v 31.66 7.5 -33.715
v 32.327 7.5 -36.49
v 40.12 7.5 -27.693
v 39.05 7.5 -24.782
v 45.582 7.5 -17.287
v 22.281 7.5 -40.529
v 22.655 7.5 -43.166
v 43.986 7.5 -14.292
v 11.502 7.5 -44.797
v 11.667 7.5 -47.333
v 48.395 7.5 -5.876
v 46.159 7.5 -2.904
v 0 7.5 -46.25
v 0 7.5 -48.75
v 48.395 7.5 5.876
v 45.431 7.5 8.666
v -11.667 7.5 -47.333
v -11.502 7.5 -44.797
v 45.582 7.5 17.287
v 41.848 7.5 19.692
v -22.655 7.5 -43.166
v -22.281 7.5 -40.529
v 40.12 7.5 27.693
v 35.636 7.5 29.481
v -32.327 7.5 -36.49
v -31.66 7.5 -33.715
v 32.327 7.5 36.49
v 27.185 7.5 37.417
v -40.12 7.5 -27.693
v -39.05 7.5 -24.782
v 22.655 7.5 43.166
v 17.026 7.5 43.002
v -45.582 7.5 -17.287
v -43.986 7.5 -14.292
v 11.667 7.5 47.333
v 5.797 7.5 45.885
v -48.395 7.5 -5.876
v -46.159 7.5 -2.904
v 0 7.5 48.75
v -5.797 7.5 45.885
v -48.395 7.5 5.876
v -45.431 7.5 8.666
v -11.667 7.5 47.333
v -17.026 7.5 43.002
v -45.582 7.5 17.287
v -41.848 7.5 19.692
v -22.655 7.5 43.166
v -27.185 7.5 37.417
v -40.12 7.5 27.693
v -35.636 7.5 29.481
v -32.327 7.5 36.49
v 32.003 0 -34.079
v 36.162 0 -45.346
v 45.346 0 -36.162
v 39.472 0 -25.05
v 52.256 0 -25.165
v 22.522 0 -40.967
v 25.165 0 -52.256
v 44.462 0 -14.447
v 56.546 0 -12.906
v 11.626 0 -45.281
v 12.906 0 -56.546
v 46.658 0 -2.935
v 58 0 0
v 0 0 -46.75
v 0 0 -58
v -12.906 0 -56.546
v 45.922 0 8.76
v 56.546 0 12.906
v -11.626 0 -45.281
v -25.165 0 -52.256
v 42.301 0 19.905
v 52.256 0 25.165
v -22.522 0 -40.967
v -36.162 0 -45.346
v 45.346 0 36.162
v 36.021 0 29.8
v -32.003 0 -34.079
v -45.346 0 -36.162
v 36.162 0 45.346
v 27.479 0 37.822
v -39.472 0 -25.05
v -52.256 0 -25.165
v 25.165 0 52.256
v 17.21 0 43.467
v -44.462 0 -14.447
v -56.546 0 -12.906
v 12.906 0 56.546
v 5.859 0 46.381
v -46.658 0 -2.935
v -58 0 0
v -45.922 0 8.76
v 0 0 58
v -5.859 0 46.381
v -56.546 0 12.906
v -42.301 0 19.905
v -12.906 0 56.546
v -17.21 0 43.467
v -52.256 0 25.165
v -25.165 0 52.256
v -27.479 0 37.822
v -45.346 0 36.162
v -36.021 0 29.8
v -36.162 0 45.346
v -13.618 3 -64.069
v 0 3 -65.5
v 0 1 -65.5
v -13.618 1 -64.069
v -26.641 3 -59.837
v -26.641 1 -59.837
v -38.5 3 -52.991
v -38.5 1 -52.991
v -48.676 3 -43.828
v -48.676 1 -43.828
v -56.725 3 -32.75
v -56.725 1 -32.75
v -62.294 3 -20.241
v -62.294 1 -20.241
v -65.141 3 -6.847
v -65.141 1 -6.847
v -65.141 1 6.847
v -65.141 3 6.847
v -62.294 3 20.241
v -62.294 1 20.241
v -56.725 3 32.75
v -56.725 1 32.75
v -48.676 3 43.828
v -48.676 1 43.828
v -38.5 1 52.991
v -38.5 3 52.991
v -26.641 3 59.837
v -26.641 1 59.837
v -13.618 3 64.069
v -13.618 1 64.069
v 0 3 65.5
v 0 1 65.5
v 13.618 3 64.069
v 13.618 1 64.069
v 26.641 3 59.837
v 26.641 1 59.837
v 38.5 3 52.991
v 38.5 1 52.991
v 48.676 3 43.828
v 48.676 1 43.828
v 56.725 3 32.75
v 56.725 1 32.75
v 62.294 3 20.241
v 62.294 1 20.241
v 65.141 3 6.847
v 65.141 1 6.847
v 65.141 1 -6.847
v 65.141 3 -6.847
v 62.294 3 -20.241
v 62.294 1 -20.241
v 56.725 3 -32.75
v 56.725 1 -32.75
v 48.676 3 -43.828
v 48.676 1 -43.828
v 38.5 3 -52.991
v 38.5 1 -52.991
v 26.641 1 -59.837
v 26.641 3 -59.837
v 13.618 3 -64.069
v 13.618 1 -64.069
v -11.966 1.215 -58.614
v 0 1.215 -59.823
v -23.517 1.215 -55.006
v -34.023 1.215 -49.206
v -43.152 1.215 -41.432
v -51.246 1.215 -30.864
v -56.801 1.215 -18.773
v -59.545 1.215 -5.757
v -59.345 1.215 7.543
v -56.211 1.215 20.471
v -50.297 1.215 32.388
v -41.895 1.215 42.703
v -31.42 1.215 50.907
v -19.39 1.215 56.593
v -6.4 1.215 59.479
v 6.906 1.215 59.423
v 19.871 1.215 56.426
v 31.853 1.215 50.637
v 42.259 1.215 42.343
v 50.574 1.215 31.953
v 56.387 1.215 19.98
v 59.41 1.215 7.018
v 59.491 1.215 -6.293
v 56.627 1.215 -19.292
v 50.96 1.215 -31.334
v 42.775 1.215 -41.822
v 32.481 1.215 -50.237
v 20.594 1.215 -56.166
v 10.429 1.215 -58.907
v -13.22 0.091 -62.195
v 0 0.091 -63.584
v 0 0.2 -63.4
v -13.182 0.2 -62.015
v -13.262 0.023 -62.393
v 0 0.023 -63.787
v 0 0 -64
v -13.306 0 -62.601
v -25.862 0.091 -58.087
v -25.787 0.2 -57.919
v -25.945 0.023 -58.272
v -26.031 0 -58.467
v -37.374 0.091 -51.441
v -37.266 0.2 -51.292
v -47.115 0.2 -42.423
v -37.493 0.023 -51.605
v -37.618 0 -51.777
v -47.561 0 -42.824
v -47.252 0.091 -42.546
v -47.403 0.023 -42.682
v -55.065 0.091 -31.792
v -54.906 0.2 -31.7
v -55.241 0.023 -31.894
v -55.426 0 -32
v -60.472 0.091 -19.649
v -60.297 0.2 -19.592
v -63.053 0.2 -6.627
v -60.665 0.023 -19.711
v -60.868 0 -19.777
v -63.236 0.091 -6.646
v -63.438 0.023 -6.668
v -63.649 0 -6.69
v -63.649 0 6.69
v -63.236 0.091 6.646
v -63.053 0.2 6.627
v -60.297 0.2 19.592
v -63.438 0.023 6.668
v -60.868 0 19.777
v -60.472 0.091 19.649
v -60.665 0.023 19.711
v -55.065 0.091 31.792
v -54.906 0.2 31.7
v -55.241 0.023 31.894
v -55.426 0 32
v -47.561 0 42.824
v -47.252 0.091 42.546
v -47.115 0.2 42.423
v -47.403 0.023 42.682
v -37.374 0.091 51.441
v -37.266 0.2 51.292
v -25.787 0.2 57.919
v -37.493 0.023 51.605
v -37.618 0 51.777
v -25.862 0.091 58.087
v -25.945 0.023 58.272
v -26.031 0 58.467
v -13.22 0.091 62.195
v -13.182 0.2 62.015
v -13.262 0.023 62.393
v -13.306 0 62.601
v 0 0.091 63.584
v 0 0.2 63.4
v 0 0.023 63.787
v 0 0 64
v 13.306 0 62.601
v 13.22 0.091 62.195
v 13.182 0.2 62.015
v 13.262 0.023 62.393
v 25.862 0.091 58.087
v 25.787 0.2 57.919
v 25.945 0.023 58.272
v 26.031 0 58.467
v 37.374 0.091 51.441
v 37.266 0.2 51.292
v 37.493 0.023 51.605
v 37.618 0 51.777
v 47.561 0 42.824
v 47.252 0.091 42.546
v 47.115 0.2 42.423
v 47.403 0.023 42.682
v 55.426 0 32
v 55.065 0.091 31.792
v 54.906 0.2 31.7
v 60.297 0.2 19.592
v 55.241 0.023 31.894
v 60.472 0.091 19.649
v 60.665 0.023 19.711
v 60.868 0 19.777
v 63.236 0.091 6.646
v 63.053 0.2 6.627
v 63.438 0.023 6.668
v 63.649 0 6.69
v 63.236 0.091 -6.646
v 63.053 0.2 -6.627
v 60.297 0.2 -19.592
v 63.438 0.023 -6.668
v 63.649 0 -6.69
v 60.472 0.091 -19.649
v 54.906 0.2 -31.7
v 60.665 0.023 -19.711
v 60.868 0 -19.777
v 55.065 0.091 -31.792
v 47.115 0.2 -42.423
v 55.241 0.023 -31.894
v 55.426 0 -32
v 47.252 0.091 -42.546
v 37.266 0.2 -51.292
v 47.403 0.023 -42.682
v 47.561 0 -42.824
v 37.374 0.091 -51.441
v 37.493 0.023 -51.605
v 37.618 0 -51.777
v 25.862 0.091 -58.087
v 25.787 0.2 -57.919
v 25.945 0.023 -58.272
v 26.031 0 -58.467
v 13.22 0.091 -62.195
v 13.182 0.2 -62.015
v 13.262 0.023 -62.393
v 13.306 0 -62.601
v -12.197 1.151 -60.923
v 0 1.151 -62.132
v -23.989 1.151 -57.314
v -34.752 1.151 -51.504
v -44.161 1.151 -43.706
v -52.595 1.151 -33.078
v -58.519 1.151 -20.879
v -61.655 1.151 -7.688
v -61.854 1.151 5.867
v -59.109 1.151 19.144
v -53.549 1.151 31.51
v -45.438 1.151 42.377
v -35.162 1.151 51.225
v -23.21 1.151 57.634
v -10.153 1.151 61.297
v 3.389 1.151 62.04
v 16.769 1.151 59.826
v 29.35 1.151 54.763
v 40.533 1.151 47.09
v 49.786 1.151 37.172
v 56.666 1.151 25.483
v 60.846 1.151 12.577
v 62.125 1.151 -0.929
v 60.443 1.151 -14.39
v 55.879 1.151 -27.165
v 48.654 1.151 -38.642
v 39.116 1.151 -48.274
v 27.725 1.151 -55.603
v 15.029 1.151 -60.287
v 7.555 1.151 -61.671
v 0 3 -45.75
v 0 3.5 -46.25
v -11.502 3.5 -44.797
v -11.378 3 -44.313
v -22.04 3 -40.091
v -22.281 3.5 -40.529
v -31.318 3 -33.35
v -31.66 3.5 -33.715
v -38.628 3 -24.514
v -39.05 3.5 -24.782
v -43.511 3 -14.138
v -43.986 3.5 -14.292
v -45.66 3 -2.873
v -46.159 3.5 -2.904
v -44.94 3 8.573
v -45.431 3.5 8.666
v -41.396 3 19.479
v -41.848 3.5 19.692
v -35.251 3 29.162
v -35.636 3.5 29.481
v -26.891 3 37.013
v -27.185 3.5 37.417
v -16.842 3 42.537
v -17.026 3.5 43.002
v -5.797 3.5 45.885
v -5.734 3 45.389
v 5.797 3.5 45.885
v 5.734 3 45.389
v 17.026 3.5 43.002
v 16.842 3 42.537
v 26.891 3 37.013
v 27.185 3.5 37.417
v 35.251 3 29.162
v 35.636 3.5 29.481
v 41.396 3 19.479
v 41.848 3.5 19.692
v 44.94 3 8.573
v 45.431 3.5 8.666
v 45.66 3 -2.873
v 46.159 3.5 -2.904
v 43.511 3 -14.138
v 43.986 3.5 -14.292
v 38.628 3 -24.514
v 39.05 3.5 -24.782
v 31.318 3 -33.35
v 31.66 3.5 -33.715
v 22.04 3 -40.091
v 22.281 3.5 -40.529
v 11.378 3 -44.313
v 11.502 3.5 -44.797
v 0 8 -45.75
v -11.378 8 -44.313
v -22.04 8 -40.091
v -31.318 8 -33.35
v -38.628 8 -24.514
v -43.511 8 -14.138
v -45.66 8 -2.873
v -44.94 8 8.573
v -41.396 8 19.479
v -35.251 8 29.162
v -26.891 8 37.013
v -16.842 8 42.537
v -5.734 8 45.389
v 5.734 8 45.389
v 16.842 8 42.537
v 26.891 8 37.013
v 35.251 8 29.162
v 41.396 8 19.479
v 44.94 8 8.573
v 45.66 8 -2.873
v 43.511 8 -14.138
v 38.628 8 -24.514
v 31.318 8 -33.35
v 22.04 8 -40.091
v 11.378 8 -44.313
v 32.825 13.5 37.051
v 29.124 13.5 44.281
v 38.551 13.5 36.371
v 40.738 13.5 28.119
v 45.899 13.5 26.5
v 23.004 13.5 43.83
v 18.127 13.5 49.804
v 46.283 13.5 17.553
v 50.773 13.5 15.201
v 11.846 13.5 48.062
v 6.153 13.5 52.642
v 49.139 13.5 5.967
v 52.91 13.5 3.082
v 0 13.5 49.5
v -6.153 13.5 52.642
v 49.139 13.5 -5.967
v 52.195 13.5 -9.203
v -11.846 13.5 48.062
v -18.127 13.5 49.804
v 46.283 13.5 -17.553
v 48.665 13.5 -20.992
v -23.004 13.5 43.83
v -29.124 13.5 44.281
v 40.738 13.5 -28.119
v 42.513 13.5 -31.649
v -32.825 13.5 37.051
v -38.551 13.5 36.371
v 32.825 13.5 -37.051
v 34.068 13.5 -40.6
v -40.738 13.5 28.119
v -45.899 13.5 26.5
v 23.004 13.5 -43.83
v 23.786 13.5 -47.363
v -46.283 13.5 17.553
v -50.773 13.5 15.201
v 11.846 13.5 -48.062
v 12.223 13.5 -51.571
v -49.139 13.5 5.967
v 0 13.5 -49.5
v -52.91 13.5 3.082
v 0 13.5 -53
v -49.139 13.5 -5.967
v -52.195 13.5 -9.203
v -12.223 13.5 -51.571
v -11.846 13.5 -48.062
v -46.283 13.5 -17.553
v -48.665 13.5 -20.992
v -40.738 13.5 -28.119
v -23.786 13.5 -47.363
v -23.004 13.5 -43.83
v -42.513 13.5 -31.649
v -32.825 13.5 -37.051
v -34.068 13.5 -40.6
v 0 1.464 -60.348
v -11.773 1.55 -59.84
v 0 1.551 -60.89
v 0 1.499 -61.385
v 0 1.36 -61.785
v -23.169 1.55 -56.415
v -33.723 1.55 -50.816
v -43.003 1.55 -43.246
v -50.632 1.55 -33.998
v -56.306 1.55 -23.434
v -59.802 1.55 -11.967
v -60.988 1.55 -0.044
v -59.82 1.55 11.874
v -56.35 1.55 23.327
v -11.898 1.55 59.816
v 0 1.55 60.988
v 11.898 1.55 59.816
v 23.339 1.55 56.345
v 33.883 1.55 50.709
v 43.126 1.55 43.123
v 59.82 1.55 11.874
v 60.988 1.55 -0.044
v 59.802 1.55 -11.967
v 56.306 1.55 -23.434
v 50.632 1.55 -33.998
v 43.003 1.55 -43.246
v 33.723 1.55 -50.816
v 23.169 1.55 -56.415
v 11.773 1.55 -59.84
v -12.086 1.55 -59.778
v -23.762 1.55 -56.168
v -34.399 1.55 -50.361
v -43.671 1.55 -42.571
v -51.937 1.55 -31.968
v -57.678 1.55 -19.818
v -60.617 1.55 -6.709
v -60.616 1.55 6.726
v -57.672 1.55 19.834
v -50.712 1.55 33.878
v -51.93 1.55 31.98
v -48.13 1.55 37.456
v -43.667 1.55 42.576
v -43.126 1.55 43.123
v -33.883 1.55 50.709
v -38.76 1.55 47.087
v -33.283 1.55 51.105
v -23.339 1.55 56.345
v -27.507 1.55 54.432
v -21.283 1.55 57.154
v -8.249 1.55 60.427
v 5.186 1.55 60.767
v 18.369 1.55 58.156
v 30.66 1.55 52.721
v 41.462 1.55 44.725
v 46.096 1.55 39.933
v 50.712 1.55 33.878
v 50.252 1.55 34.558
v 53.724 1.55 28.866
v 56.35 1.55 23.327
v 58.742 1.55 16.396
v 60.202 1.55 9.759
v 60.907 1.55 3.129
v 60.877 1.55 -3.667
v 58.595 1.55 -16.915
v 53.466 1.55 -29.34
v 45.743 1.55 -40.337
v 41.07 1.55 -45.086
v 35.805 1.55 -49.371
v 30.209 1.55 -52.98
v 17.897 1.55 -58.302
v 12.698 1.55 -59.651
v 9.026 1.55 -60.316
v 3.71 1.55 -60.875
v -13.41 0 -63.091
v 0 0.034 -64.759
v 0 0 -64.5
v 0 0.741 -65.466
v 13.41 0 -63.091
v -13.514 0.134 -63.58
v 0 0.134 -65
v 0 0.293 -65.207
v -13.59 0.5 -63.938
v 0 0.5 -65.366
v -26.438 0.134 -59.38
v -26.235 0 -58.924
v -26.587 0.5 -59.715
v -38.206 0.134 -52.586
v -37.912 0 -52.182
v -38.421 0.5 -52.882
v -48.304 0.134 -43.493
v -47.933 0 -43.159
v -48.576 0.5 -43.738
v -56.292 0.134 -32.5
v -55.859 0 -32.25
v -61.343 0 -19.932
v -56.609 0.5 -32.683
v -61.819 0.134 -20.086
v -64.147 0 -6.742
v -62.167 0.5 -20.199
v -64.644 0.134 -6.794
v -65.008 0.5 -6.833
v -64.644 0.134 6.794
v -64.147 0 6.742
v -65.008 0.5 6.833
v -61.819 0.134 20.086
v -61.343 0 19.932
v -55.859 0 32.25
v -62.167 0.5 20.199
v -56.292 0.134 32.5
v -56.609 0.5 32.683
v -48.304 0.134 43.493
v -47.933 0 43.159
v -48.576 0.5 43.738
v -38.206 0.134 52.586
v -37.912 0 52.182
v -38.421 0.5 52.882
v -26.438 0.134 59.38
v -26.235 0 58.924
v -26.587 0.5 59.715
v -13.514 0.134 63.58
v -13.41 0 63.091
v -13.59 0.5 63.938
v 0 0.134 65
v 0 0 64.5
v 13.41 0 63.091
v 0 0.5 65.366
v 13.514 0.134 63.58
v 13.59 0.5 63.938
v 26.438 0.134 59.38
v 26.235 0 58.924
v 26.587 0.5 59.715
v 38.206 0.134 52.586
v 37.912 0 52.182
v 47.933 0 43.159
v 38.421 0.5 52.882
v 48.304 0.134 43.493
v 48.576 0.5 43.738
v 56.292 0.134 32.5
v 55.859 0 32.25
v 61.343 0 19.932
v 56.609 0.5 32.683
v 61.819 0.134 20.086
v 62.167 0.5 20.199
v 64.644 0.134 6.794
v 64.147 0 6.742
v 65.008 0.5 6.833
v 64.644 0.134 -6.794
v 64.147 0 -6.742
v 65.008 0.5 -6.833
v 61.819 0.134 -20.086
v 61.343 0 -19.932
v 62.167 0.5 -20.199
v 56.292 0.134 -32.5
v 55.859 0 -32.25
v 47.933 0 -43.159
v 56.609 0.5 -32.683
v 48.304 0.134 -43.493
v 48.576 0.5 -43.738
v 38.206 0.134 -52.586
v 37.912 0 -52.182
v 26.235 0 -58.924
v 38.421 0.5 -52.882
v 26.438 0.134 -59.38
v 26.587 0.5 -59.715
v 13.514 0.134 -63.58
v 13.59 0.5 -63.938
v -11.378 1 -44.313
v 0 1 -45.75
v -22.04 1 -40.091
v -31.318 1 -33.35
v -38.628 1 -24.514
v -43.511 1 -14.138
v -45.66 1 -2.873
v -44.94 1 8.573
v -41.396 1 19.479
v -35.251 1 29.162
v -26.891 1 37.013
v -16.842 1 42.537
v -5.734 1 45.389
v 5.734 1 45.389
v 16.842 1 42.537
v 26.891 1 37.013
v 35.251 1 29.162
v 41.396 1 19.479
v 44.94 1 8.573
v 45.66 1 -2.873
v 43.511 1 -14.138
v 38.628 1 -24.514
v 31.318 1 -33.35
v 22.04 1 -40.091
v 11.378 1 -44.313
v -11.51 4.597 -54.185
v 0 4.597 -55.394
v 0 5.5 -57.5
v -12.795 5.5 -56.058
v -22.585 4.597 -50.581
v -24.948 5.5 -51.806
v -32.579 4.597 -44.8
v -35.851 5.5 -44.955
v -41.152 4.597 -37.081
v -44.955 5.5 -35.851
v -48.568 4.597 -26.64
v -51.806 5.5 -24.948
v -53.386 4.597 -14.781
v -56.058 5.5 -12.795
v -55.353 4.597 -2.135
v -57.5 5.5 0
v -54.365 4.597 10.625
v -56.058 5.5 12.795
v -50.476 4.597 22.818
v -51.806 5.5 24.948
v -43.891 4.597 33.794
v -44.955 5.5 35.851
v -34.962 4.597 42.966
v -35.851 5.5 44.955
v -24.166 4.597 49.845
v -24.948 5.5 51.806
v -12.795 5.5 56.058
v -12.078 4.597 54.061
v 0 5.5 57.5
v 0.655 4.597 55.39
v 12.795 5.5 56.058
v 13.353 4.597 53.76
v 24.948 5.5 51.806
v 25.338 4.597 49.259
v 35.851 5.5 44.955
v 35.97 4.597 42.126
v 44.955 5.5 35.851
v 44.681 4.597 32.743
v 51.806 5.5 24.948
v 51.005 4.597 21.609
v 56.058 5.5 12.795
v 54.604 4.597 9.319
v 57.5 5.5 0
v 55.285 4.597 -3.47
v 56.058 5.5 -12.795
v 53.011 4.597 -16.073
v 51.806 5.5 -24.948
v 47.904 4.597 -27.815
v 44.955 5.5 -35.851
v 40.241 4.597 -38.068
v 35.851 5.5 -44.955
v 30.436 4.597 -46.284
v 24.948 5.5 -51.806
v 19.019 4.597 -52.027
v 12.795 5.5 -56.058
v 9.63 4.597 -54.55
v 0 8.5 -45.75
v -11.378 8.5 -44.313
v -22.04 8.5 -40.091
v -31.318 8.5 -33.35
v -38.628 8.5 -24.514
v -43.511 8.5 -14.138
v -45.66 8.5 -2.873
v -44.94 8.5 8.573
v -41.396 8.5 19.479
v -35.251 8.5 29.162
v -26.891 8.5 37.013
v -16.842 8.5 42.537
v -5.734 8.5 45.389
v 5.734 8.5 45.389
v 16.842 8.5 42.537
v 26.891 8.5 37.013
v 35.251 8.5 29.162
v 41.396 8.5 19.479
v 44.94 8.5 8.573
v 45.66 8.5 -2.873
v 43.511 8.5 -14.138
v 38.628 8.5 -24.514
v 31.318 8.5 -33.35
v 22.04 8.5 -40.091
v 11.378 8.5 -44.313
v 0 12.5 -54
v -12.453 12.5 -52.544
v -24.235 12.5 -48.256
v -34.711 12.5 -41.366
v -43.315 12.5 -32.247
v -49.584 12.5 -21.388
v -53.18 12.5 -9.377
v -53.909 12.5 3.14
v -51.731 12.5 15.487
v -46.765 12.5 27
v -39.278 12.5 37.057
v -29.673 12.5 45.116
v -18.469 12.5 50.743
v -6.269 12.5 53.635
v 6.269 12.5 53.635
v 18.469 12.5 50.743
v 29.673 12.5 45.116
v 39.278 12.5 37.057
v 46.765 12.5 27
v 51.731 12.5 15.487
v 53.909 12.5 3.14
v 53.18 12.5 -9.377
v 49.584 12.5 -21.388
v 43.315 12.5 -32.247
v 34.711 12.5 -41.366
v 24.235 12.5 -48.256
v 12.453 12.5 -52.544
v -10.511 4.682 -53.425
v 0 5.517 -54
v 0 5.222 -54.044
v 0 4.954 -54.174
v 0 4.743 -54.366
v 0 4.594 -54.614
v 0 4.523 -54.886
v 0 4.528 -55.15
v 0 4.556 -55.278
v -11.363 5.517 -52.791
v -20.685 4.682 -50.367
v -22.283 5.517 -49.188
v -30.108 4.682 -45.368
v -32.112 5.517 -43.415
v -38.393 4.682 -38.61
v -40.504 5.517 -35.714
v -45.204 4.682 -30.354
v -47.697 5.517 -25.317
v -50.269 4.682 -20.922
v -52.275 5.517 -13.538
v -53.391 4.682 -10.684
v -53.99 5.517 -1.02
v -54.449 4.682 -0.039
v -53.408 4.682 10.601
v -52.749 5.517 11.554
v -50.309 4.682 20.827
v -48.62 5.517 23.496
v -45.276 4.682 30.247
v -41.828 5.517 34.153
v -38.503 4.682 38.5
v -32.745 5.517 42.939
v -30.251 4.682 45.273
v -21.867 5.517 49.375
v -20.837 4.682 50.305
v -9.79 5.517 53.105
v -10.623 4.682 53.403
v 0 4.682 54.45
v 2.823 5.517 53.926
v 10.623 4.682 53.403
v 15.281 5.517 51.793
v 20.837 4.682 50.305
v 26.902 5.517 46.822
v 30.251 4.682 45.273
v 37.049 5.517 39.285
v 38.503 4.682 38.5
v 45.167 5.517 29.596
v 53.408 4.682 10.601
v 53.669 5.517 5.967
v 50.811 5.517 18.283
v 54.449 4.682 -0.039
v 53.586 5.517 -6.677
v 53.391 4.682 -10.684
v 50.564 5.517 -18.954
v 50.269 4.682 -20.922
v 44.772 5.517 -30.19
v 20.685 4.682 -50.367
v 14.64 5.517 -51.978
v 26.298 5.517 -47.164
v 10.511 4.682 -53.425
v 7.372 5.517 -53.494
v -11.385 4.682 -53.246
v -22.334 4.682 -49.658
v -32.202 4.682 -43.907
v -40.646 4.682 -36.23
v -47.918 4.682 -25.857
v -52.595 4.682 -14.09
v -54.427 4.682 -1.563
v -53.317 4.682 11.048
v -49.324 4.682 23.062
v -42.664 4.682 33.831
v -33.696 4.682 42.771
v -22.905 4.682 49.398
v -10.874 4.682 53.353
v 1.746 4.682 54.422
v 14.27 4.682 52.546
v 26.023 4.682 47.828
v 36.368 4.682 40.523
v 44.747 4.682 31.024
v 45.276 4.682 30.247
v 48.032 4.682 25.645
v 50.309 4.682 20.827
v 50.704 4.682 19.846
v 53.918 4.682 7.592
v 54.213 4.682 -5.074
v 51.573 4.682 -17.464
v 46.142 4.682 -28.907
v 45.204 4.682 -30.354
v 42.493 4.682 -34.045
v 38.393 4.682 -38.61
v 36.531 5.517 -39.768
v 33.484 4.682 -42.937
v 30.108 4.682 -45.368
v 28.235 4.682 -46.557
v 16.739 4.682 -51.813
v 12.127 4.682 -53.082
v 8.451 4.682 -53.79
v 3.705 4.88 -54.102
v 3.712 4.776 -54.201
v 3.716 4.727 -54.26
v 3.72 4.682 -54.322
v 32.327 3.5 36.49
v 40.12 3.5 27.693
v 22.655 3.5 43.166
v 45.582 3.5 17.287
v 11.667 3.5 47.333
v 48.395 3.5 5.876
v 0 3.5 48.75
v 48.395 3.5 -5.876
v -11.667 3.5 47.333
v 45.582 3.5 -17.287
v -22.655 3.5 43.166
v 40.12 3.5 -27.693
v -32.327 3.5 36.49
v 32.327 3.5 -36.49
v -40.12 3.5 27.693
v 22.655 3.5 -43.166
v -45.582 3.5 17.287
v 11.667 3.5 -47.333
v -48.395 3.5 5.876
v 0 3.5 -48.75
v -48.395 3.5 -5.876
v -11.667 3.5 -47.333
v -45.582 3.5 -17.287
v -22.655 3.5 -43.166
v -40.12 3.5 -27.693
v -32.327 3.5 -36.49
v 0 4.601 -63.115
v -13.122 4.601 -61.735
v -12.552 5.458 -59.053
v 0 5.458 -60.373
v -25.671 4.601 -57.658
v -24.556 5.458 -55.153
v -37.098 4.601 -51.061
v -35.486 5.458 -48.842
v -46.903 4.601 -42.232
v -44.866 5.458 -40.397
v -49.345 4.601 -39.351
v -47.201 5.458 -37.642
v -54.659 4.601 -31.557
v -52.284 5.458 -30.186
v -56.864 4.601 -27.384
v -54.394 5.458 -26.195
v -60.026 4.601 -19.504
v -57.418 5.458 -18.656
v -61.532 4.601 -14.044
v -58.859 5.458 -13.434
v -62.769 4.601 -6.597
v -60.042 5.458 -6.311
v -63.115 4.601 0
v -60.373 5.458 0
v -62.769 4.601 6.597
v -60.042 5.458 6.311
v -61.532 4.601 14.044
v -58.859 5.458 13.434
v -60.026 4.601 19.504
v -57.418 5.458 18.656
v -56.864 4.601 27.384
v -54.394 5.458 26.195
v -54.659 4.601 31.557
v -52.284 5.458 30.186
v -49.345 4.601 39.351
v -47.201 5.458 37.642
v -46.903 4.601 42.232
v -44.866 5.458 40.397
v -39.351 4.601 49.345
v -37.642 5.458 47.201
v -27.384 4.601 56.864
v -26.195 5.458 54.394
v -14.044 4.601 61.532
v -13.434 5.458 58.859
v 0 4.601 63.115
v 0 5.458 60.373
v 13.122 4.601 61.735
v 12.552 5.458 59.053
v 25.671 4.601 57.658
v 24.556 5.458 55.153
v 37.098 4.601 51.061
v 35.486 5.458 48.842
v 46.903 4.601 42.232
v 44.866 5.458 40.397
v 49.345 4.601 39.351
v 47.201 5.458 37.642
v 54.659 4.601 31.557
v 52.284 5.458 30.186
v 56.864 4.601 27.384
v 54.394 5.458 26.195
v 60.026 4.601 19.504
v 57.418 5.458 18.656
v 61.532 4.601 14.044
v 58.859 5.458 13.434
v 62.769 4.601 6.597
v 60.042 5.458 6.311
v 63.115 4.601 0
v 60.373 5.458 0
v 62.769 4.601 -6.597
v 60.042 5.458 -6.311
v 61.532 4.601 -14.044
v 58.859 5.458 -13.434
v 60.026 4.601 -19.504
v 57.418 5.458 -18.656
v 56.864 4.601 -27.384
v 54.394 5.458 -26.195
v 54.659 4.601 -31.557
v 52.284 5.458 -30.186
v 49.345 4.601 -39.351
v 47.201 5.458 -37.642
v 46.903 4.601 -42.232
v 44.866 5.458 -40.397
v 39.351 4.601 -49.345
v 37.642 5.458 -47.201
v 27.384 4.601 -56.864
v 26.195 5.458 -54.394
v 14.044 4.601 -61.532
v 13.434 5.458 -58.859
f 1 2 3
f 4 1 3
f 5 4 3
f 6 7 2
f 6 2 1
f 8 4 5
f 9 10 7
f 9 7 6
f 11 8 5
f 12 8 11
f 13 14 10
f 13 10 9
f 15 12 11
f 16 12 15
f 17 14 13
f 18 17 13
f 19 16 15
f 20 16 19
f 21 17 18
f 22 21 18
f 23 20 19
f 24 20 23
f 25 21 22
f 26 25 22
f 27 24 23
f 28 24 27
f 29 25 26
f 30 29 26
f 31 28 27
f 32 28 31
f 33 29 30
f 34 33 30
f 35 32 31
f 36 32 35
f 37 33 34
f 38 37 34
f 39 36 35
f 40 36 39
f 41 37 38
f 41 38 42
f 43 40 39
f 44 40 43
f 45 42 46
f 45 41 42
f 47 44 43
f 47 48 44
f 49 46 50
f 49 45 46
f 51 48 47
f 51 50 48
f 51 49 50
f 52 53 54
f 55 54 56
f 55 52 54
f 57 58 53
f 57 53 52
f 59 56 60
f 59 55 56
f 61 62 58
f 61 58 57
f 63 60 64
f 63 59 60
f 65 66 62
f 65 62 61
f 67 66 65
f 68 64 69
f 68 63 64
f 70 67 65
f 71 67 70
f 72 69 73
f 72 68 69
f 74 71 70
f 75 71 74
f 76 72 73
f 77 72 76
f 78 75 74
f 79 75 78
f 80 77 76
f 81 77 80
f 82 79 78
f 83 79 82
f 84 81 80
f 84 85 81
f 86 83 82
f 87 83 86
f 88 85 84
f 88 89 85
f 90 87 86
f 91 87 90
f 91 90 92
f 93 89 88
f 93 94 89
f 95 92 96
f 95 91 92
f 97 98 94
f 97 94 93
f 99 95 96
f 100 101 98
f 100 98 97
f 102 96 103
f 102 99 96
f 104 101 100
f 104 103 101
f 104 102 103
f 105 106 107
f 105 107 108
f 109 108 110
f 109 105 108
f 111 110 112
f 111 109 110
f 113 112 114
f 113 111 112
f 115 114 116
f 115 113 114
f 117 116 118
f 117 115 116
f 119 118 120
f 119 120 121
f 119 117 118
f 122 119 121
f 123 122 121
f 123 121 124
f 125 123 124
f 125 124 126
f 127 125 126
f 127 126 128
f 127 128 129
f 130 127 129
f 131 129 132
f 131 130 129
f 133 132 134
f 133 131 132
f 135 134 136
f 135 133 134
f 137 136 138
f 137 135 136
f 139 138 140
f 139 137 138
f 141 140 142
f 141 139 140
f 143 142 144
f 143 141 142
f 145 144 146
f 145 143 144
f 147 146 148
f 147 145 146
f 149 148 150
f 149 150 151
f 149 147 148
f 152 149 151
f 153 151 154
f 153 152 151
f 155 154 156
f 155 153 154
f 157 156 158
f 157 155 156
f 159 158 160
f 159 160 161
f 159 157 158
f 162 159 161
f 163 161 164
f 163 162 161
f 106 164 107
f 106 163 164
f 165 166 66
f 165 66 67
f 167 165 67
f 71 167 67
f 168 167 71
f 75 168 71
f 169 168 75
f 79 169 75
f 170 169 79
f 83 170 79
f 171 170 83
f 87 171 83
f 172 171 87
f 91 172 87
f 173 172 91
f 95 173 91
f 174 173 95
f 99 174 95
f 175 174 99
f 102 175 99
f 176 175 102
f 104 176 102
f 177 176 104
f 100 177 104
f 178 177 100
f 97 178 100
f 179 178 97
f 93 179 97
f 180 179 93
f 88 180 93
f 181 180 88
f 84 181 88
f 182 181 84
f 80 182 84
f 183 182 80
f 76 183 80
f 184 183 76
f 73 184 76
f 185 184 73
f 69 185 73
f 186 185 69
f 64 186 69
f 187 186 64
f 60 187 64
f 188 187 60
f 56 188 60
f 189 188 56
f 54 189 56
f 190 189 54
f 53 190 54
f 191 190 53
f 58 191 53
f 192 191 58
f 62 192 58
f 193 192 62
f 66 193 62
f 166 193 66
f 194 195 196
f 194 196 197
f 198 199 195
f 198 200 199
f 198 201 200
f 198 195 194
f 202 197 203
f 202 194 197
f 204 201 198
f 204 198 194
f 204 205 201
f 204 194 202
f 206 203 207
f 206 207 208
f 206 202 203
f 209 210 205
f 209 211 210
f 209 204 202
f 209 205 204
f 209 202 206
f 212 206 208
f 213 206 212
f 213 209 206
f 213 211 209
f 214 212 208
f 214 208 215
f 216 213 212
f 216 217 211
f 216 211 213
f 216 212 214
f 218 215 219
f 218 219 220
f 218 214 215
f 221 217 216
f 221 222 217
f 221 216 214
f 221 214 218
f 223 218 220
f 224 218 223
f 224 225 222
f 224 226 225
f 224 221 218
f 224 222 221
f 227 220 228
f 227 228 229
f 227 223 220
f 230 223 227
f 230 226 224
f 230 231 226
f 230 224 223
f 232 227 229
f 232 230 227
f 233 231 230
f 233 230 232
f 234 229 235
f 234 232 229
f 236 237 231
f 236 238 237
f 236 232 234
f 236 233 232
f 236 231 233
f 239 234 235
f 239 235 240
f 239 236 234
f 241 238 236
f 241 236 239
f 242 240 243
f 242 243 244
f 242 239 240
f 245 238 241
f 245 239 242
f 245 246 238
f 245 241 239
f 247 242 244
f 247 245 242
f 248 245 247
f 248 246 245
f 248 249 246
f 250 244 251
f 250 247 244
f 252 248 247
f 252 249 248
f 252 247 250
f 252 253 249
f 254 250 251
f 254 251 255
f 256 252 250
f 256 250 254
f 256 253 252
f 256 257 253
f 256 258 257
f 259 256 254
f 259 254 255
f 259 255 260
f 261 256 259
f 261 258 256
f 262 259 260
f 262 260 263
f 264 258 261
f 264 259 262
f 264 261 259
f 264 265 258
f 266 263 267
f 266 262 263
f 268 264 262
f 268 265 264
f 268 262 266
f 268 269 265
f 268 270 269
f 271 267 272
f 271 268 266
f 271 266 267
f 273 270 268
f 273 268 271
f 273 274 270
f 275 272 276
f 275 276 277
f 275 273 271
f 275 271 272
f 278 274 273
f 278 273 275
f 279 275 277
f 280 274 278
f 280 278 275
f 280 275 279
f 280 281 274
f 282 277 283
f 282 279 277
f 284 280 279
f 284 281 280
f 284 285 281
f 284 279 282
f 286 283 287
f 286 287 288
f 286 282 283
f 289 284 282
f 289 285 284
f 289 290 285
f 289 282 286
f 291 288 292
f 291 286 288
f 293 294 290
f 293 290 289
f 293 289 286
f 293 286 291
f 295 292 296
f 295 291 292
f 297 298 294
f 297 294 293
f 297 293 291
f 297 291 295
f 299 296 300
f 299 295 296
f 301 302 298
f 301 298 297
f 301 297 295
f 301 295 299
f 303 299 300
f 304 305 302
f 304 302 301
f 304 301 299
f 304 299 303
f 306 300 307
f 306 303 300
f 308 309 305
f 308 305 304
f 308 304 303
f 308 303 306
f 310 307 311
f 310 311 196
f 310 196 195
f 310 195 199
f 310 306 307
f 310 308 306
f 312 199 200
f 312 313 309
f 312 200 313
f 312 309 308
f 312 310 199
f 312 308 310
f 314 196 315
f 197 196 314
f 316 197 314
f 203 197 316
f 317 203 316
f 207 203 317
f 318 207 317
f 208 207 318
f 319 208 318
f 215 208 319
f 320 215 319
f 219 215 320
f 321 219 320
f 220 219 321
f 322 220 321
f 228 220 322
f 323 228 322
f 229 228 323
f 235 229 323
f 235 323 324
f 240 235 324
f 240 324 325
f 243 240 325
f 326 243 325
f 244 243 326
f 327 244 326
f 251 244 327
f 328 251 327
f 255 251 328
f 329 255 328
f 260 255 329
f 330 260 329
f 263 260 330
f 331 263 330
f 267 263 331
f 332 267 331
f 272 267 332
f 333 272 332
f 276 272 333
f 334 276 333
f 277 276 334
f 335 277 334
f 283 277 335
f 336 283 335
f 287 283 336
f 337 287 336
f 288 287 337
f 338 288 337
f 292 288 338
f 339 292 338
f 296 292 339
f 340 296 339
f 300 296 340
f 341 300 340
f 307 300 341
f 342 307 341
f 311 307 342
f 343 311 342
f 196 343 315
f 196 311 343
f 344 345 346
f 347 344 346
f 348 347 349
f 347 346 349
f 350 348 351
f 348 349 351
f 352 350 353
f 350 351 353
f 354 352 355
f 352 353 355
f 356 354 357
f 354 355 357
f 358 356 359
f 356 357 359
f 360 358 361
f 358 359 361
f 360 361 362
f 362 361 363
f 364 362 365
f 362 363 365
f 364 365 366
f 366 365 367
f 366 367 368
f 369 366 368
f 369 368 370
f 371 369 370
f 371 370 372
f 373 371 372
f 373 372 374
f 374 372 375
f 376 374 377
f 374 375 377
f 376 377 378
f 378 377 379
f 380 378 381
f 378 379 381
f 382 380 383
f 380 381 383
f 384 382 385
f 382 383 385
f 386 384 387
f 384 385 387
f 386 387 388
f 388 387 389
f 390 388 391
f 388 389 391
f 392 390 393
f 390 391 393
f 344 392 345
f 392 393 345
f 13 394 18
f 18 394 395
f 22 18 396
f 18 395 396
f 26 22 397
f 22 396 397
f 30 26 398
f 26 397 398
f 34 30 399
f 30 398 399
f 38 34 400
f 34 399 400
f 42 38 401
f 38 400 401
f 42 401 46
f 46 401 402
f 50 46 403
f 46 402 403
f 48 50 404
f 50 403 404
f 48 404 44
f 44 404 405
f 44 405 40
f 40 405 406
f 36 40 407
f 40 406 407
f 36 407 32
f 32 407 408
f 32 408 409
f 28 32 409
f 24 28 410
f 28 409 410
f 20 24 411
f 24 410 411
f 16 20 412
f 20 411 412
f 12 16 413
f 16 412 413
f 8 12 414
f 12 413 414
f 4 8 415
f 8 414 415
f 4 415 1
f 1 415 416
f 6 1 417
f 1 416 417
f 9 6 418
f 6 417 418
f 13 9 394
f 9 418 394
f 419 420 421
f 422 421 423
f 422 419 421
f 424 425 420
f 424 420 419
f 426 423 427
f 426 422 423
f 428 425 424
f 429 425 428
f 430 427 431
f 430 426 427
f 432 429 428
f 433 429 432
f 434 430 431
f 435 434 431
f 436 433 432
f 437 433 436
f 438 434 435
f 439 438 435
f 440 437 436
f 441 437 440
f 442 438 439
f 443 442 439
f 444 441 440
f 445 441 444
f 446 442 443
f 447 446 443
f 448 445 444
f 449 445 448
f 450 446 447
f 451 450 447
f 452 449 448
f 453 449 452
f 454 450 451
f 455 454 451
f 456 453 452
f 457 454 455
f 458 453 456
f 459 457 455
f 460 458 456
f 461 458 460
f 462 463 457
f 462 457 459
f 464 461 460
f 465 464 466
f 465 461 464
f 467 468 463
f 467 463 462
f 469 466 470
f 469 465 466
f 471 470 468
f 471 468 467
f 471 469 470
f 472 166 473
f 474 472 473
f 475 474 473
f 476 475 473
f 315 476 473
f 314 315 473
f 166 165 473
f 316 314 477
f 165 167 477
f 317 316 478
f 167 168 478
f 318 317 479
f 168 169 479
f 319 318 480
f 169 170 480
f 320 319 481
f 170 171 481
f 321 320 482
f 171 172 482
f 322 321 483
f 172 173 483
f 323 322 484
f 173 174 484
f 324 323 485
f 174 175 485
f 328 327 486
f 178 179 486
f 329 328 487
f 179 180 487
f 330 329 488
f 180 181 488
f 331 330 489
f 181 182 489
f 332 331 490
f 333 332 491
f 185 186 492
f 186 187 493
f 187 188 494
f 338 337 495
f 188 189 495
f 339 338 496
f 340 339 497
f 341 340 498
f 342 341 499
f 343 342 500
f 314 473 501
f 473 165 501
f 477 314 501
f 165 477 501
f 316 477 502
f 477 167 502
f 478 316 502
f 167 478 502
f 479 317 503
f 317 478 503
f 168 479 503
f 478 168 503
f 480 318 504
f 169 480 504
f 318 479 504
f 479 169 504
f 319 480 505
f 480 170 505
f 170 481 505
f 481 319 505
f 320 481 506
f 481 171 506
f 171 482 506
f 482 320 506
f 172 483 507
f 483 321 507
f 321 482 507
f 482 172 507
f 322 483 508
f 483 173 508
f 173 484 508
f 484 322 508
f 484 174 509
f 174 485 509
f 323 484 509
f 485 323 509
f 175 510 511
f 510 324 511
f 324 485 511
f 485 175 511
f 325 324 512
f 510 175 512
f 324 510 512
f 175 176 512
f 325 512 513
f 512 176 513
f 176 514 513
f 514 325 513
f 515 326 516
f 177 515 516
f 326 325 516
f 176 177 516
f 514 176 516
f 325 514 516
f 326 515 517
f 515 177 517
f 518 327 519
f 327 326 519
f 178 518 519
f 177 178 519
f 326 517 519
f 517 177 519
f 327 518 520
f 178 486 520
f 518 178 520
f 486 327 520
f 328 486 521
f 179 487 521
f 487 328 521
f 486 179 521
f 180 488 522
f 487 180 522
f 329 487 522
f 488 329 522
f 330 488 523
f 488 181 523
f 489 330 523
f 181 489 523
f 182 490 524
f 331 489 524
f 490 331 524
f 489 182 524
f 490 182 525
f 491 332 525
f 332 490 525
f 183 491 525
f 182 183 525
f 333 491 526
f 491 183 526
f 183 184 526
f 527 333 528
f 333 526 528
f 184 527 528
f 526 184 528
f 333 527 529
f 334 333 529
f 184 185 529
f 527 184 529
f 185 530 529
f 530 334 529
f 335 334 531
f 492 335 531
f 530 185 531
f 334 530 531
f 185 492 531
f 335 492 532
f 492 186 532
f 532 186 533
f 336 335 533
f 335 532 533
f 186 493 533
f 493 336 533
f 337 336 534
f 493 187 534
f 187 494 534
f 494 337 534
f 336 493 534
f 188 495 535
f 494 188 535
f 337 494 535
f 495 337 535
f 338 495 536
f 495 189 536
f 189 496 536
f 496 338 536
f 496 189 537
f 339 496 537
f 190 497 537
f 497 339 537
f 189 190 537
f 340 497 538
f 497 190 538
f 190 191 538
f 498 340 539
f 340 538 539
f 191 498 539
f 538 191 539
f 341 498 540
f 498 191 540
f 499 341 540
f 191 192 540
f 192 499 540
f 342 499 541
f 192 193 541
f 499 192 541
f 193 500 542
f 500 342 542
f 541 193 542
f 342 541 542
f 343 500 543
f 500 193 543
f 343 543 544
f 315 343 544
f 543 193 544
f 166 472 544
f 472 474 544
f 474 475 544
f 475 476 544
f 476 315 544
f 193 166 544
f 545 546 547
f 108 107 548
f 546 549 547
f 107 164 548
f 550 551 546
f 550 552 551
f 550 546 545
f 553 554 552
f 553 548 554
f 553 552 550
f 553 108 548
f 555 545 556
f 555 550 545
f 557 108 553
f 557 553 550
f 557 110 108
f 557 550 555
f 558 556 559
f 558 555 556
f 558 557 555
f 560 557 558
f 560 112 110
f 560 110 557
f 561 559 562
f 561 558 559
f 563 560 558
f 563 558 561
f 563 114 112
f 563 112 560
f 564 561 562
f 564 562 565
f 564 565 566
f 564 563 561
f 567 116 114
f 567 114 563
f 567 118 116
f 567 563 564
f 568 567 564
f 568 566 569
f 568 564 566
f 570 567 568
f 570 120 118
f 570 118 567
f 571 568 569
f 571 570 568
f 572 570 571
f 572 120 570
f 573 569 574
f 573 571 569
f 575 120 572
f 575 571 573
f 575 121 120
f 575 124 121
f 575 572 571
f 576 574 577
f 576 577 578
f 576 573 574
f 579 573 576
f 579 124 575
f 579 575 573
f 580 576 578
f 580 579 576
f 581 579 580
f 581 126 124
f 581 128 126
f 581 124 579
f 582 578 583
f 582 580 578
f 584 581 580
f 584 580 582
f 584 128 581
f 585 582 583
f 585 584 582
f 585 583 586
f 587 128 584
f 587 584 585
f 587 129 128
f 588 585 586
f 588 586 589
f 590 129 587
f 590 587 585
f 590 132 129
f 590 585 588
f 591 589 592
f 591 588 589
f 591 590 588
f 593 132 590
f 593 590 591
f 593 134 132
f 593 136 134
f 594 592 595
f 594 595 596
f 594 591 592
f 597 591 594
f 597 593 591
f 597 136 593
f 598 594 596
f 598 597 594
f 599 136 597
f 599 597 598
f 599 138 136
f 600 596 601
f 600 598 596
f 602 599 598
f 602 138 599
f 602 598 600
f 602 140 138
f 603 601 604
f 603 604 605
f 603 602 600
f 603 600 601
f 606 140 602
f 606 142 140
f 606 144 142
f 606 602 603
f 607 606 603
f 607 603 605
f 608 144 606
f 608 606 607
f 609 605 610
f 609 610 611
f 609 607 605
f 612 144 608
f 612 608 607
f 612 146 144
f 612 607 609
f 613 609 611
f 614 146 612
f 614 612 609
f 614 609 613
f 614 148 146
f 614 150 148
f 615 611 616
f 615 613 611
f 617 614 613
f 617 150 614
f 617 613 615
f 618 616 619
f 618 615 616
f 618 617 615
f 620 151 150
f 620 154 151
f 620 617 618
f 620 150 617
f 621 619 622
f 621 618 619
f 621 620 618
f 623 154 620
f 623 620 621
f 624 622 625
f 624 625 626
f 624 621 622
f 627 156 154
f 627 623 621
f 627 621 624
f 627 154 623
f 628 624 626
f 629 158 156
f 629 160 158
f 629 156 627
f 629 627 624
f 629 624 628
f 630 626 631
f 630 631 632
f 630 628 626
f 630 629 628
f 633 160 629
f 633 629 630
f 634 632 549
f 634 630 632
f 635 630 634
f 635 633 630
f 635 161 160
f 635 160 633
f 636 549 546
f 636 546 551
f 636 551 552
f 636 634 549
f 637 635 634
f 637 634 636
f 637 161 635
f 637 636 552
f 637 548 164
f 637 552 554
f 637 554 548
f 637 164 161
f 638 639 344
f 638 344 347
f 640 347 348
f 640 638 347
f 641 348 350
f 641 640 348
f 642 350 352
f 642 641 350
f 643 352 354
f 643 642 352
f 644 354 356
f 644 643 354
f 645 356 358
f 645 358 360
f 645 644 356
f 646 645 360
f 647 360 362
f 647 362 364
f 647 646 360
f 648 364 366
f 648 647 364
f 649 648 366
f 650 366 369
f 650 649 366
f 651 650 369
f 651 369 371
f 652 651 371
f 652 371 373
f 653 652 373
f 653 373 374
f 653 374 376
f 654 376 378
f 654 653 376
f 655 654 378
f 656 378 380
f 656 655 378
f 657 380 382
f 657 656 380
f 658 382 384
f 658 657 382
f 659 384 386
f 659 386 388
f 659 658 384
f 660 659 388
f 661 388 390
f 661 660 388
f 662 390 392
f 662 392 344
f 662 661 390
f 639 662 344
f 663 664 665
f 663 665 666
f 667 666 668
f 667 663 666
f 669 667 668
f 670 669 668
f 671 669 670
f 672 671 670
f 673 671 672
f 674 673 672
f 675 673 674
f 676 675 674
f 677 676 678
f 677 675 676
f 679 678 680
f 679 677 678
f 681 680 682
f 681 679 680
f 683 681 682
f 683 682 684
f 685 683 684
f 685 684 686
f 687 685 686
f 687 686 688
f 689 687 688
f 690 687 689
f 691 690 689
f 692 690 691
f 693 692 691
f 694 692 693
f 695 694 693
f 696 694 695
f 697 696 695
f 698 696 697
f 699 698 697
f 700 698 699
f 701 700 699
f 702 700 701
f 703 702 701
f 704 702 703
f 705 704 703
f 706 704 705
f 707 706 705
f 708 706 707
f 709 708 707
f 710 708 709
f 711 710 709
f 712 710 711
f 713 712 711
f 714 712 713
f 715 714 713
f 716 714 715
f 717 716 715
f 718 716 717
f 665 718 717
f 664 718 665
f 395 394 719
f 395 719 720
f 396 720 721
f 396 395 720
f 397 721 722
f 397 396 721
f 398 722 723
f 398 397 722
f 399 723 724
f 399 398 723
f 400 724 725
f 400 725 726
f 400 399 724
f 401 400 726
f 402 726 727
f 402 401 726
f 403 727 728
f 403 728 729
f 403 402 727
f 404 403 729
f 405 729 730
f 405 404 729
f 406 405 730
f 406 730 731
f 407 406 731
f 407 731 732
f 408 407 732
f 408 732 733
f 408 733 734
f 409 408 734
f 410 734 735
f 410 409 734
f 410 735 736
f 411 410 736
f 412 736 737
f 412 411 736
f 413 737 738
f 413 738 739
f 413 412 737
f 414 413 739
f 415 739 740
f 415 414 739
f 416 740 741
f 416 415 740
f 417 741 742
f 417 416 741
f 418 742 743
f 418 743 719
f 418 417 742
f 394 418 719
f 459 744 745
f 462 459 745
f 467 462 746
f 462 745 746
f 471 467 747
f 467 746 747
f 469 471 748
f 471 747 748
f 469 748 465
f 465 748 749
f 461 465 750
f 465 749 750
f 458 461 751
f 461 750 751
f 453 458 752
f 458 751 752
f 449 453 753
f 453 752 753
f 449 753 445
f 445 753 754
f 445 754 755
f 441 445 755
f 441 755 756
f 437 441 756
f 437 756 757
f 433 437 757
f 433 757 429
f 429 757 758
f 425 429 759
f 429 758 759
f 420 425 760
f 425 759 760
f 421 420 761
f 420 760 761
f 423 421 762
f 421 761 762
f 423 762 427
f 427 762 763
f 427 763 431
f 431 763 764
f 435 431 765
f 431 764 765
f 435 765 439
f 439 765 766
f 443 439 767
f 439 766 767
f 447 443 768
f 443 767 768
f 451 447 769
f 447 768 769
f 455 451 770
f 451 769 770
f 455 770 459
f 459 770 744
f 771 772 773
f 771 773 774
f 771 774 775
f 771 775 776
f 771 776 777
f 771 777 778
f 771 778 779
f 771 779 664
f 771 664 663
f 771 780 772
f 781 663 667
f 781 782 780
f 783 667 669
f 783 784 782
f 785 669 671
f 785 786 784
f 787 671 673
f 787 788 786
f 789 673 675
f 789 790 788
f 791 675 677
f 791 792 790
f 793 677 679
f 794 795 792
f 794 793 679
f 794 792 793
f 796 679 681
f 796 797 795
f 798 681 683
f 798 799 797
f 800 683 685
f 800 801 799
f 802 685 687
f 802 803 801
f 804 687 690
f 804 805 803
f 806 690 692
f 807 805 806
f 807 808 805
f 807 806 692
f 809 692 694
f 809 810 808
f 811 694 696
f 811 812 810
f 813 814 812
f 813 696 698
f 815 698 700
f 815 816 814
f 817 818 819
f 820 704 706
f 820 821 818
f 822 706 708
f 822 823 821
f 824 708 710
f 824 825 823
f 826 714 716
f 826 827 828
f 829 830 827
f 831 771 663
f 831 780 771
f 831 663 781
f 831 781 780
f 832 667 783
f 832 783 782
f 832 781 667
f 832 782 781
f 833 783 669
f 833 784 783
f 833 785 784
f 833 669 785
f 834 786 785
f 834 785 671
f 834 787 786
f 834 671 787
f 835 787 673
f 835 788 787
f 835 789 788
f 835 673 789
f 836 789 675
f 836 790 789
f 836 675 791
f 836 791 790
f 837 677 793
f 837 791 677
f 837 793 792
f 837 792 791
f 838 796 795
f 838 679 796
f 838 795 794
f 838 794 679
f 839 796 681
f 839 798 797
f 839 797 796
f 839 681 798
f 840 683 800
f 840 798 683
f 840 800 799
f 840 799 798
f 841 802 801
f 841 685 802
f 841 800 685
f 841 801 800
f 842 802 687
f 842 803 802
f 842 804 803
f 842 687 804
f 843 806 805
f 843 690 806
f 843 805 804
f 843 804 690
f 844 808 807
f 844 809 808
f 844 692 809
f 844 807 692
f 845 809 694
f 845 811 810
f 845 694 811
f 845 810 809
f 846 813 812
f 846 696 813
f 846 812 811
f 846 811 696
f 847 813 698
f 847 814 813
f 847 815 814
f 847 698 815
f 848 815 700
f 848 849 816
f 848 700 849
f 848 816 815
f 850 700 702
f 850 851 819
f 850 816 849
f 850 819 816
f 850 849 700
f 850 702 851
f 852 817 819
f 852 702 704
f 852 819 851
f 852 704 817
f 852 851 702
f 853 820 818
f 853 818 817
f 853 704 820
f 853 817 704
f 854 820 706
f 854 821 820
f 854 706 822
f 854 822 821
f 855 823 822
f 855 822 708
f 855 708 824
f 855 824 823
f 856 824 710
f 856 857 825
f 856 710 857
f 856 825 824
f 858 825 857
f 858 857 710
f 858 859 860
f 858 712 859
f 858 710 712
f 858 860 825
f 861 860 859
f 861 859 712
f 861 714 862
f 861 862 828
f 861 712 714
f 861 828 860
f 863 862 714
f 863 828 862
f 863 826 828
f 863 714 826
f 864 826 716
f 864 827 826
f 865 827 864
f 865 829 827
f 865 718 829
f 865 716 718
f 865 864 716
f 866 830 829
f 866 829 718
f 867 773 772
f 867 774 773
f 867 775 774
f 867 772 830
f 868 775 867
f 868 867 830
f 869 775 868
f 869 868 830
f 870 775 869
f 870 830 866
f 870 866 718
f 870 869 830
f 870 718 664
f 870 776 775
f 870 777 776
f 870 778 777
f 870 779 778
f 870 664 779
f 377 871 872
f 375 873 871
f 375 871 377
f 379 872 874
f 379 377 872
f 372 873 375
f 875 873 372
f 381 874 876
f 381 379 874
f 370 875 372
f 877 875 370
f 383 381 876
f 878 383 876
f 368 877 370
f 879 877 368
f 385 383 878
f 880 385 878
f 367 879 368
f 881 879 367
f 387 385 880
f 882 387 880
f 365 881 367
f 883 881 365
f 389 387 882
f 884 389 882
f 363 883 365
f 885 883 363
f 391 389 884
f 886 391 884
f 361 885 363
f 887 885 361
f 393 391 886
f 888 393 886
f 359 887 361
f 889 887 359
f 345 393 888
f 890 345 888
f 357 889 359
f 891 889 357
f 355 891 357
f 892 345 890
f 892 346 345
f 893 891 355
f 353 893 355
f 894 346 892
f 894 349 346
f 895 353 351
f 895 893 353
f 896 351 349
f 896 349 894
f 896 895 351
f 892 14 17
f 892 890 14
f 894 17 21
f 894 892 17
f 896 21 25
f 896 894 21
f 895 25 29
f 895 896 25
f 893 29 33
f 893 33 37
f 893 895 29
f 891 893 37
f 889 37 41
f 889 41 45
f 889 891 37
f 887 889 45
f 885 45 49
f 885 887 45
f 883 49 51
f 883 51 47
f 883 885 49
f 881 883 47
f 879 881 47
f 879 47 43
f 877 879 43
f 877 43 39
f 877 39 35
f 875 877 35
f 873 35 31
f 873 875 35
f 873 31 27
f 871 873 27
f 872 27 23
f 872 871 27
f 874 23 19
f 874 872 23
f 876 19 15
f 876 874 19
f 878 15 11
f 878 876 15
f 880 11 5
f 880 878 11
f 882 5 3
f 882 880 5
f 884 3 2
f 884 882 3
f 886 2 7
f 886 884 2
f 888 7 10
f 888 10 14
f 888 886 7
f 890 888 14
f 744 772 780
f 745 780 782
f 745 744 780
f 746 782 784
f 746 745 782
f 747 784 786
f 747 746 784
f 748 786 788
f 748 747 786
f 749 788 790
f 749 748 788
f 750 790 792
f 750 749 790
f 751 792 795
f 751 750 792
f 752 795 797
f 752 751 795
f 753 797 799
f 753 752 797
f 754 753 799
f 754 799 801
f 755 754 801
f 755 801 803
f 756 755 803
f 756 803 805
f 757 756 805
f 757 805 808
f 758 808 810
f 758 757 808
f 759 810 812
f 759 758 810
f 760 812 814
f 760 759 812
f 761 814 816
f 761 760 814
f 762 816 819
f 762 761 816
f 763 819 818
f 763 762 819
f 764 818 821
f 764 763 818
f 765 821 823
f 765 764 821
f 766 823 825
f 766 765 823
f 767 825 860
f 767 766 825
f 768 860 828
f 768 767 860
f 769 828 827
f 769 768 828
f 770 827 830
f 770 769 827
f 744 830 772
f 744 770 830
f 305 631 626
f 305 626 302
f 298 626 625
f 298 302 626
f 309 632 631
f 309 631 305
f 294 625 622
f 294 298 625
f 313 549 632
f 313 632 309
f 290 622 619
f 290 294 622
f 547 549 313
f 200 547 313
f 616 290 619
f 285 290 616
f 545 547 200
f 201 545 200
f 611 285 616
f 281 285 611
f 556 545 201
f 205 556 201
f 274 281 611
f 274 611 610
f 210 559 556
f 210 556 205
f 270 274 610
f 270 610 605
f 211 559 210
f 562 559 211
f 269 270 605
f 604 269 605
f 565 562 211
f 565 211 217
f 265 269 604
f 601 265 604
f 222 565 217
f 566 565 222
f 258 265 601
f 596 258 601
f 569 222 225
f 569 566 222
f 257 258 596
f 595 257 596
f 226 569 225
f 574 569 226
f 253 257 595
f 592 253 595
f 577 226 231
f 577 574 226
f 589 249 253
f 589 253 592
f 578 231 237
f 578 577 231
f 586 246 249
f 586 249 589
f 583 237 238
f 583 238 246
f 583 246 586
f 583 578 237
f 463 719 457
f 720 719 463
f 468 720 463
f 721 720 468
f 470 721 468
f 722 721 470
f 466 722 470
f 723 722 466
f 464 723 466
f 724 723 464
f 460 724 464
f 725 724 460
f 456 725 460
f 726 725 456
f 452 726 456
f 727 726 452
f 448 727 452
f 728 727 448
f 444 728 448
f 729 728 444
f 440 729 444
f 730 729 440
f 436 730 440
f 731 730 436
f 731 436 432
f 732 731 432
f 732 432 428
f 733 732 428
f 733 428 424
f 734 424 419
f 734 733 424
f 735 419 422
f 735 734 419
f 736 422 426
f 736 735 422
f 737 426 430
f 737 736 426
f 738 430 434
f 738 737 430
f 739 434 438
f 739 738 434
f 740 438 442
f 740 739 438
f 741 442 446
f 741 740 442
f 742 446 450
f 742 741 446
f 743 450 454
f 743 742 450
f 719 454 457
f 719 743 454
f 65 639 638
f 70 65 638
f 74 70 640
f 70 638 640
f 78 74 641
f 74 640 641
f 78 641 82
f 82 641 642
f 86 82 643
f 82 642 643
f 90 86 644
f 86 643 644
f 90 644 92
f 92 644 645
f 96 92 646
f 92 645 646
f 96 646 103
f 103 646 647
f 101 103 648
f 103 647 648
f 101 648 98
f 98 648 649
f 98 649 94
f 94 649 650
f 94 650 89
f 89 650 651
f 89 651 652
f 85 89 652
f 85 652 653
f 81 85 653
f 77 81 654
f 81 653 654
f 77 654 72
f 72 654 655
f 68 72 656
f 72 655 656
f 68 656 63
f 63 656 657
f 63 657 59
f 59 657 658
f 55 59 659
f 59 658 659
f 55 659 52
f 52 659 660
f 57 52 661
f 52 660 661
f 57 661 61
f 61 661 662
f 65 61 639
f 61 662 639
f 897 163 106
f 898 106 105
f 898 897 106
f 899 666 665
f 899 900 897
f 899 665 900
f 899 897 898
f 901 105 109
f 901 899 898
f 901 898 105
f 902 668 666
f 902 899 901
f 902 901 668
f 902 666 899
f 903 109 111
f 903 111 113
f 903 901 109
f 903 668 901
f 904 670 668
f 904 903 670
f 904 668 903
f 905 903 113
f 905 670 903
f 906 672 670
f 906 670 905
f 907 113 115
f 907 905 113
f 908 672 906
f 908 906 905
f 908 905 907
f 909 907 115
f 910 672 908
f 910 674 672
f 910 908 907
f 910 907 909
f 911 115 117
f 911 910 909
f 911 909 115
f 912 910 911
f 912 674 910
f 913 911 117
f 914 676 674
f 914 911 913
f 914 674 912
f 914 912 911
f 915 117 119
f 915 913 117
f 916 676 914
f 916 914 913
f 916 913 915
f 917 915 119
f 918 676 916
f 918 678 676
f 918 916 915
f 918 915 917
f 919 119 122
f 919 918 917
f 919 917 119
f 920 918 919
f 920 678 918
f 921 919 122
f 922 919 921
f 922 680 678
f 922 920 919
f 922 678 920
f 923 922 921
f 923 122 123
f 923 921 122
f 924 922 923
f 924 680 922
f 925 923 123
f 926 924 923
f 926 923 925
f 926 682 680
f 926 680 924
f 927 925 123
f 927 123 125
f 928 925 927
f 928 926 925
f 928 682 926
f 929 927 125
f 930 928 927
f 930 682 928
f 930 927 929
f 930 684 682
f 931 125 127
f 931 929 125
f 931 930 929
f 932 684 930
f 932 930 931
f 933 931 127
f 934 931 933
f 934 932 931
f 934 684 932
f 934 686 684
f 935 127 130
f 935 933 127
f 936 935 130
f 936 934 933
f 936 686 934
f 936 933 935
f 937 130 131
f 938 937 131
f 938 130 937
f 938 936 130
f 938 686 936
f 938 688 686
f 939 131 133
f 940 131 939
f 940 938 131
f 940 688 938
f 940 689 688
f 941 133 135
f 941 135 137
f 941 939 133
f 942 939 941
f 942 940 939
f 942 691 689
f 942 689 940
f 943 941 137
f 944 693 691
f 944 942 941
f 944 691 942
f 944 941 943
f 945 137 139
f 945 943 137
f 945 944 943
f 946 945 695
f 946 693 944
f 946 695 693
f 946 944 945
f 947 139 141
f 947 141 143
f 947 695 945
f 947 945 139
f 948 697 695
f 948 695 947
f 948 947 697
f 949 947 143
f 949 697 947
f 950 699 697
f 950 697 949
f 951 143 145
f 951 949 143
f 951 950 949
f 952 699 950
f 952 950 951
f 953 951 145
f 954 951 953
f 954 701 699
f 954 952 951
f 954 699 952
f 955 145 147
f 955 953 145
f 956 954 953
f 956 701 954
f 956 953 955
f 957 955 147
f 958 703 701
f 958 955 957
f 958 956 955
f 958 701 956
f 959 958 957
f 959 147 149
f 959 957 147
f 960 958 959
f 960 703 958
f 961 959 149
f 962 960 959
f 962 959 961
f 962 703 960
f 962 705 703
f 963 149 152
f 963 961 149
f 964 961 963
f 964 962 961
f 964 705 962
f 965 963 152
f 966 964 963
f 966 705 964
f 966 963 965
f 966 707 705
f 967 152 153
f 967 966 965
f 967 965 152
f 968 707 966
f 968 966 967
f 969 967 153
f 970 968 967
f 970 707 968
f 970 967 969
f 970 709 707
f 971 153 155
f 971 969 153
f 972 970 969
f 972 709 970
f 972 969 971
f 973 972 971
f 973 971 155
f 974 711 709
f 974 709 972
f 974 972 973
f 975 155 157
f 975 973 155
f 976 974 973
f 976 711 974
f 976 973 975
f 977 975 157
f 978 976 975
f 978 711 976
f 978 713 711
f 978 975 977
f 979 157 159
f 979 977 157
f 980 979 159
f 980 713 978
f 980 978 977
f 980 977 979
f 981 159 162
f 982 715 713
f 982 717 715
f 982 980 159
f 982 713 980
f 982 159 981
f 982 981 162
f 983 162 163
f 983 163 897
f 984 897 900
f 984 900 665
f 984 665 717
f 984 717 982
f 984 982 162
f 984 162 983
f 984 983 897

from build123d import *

# Parameters (mm, degrees)
FILETE1_R     = 2
FILETE2_R     = 1
FILETE3_R     = 1
CHANFRO1_SIZE = 1
CHANFRO2_SIZE = 0.5
CHANFRO3_SIZE = 1
FILETE4_R     = 1


with BuildPart() as part:
    # Esboço1 → Revolução1 (revolve)
    with BuildSketch(Plane.XY, mode=Mode.PRIVATE) as revolu_o1_sk:
        with BuildLine():
            Line((58, 0), (61, 2))
            Line((61, 2), (63.666666667, 0))
            Line((63.666666667, 0), (65.5, 0))
            Line((65.5, 0), (65.5, 3))
            ThreePointArc((65.5, 3), (61.774559179, 5.128589372), (57.5, 5.5))
            Line((57.5, 5.5), (54, 4))
            Line((54, 4), (54, 13.5))
            Line((54, 13.5), (49.5, 13.5))
            Line((49.5, 13.5), (45.75, 8.5))
            Line((45.75, 8.5), (45.75, 7.5))
            Line((45.75, 7.5), (48.75, 7.5))
            Line((48.75, 7.5), (48.75, 3.5))
            Line((48.75, 3.5), (45.75, 3.5))
            Line((45.75, 3.5), (45.75, 0))
            Line((45.75, 0), (58, 0))
        make_face()
    revolve(revolu_o1_sk.sketch.rotate(Axis((0, -63.329102972, 0), (0, 1, 0)), 90), axis=Axis((0, -63.329102972, 0), (0, 1, 0)))

    # Filete1
    filete1_edges = [part.edges().sort_by_distance(p)[0] for p in [
        (0, 2, 61),
    ]]
    fillet(filete1_edges, radius=FILETE1_R)

    # Filete2
    filete2_edges = [part.edges().sort_by_distance(p)[0] for p in [
        (0, 0, 63.666666667),
    ]]
    fillet(filete2_edges, radius=FILETE2_R)

    # Filete3
    filete3_edges = [part.edges().sort_by_distance(p)[0] for p in [
        (0, 0, 65.5),
    ]]
    fillet(filete3_edges, radius=FILETE3_R)

    # Chanfro1
    chanfro1_edges = [part.edges().sort_by_distance(p)[0] for p in [
        (0, 0, 45.75),
    ]]
    chamfer(chanfro1_edges, length=CHANFRO1_SIZE)

    # Chanfro2
    chanfro2_edges = [part.edges().sort_by_distance(p)[0] for p in [
        (0, 7.5, 45.75),
        (0, 3.5, 45.75),
    ]]
    chamfer(chanfro2_edges, length=CHANFRO2_SIZE)

    # Chanfro3
    chanfro3_edges = [part.edges().sort_by_distance(p)[0] for p in [
        (0, 13.5, 54),
    ]]
    chamfer(chanfro3_edges, length=CHANFRO3_SIZE)

    # Filete4
    filete4_edges = [part.edges().sort_by_distance(p)[0] for p in [
        (0, 4, 54),
    ]]
    fillet(filete4_edges, radius=FILETE4_R)


solid = part.part
